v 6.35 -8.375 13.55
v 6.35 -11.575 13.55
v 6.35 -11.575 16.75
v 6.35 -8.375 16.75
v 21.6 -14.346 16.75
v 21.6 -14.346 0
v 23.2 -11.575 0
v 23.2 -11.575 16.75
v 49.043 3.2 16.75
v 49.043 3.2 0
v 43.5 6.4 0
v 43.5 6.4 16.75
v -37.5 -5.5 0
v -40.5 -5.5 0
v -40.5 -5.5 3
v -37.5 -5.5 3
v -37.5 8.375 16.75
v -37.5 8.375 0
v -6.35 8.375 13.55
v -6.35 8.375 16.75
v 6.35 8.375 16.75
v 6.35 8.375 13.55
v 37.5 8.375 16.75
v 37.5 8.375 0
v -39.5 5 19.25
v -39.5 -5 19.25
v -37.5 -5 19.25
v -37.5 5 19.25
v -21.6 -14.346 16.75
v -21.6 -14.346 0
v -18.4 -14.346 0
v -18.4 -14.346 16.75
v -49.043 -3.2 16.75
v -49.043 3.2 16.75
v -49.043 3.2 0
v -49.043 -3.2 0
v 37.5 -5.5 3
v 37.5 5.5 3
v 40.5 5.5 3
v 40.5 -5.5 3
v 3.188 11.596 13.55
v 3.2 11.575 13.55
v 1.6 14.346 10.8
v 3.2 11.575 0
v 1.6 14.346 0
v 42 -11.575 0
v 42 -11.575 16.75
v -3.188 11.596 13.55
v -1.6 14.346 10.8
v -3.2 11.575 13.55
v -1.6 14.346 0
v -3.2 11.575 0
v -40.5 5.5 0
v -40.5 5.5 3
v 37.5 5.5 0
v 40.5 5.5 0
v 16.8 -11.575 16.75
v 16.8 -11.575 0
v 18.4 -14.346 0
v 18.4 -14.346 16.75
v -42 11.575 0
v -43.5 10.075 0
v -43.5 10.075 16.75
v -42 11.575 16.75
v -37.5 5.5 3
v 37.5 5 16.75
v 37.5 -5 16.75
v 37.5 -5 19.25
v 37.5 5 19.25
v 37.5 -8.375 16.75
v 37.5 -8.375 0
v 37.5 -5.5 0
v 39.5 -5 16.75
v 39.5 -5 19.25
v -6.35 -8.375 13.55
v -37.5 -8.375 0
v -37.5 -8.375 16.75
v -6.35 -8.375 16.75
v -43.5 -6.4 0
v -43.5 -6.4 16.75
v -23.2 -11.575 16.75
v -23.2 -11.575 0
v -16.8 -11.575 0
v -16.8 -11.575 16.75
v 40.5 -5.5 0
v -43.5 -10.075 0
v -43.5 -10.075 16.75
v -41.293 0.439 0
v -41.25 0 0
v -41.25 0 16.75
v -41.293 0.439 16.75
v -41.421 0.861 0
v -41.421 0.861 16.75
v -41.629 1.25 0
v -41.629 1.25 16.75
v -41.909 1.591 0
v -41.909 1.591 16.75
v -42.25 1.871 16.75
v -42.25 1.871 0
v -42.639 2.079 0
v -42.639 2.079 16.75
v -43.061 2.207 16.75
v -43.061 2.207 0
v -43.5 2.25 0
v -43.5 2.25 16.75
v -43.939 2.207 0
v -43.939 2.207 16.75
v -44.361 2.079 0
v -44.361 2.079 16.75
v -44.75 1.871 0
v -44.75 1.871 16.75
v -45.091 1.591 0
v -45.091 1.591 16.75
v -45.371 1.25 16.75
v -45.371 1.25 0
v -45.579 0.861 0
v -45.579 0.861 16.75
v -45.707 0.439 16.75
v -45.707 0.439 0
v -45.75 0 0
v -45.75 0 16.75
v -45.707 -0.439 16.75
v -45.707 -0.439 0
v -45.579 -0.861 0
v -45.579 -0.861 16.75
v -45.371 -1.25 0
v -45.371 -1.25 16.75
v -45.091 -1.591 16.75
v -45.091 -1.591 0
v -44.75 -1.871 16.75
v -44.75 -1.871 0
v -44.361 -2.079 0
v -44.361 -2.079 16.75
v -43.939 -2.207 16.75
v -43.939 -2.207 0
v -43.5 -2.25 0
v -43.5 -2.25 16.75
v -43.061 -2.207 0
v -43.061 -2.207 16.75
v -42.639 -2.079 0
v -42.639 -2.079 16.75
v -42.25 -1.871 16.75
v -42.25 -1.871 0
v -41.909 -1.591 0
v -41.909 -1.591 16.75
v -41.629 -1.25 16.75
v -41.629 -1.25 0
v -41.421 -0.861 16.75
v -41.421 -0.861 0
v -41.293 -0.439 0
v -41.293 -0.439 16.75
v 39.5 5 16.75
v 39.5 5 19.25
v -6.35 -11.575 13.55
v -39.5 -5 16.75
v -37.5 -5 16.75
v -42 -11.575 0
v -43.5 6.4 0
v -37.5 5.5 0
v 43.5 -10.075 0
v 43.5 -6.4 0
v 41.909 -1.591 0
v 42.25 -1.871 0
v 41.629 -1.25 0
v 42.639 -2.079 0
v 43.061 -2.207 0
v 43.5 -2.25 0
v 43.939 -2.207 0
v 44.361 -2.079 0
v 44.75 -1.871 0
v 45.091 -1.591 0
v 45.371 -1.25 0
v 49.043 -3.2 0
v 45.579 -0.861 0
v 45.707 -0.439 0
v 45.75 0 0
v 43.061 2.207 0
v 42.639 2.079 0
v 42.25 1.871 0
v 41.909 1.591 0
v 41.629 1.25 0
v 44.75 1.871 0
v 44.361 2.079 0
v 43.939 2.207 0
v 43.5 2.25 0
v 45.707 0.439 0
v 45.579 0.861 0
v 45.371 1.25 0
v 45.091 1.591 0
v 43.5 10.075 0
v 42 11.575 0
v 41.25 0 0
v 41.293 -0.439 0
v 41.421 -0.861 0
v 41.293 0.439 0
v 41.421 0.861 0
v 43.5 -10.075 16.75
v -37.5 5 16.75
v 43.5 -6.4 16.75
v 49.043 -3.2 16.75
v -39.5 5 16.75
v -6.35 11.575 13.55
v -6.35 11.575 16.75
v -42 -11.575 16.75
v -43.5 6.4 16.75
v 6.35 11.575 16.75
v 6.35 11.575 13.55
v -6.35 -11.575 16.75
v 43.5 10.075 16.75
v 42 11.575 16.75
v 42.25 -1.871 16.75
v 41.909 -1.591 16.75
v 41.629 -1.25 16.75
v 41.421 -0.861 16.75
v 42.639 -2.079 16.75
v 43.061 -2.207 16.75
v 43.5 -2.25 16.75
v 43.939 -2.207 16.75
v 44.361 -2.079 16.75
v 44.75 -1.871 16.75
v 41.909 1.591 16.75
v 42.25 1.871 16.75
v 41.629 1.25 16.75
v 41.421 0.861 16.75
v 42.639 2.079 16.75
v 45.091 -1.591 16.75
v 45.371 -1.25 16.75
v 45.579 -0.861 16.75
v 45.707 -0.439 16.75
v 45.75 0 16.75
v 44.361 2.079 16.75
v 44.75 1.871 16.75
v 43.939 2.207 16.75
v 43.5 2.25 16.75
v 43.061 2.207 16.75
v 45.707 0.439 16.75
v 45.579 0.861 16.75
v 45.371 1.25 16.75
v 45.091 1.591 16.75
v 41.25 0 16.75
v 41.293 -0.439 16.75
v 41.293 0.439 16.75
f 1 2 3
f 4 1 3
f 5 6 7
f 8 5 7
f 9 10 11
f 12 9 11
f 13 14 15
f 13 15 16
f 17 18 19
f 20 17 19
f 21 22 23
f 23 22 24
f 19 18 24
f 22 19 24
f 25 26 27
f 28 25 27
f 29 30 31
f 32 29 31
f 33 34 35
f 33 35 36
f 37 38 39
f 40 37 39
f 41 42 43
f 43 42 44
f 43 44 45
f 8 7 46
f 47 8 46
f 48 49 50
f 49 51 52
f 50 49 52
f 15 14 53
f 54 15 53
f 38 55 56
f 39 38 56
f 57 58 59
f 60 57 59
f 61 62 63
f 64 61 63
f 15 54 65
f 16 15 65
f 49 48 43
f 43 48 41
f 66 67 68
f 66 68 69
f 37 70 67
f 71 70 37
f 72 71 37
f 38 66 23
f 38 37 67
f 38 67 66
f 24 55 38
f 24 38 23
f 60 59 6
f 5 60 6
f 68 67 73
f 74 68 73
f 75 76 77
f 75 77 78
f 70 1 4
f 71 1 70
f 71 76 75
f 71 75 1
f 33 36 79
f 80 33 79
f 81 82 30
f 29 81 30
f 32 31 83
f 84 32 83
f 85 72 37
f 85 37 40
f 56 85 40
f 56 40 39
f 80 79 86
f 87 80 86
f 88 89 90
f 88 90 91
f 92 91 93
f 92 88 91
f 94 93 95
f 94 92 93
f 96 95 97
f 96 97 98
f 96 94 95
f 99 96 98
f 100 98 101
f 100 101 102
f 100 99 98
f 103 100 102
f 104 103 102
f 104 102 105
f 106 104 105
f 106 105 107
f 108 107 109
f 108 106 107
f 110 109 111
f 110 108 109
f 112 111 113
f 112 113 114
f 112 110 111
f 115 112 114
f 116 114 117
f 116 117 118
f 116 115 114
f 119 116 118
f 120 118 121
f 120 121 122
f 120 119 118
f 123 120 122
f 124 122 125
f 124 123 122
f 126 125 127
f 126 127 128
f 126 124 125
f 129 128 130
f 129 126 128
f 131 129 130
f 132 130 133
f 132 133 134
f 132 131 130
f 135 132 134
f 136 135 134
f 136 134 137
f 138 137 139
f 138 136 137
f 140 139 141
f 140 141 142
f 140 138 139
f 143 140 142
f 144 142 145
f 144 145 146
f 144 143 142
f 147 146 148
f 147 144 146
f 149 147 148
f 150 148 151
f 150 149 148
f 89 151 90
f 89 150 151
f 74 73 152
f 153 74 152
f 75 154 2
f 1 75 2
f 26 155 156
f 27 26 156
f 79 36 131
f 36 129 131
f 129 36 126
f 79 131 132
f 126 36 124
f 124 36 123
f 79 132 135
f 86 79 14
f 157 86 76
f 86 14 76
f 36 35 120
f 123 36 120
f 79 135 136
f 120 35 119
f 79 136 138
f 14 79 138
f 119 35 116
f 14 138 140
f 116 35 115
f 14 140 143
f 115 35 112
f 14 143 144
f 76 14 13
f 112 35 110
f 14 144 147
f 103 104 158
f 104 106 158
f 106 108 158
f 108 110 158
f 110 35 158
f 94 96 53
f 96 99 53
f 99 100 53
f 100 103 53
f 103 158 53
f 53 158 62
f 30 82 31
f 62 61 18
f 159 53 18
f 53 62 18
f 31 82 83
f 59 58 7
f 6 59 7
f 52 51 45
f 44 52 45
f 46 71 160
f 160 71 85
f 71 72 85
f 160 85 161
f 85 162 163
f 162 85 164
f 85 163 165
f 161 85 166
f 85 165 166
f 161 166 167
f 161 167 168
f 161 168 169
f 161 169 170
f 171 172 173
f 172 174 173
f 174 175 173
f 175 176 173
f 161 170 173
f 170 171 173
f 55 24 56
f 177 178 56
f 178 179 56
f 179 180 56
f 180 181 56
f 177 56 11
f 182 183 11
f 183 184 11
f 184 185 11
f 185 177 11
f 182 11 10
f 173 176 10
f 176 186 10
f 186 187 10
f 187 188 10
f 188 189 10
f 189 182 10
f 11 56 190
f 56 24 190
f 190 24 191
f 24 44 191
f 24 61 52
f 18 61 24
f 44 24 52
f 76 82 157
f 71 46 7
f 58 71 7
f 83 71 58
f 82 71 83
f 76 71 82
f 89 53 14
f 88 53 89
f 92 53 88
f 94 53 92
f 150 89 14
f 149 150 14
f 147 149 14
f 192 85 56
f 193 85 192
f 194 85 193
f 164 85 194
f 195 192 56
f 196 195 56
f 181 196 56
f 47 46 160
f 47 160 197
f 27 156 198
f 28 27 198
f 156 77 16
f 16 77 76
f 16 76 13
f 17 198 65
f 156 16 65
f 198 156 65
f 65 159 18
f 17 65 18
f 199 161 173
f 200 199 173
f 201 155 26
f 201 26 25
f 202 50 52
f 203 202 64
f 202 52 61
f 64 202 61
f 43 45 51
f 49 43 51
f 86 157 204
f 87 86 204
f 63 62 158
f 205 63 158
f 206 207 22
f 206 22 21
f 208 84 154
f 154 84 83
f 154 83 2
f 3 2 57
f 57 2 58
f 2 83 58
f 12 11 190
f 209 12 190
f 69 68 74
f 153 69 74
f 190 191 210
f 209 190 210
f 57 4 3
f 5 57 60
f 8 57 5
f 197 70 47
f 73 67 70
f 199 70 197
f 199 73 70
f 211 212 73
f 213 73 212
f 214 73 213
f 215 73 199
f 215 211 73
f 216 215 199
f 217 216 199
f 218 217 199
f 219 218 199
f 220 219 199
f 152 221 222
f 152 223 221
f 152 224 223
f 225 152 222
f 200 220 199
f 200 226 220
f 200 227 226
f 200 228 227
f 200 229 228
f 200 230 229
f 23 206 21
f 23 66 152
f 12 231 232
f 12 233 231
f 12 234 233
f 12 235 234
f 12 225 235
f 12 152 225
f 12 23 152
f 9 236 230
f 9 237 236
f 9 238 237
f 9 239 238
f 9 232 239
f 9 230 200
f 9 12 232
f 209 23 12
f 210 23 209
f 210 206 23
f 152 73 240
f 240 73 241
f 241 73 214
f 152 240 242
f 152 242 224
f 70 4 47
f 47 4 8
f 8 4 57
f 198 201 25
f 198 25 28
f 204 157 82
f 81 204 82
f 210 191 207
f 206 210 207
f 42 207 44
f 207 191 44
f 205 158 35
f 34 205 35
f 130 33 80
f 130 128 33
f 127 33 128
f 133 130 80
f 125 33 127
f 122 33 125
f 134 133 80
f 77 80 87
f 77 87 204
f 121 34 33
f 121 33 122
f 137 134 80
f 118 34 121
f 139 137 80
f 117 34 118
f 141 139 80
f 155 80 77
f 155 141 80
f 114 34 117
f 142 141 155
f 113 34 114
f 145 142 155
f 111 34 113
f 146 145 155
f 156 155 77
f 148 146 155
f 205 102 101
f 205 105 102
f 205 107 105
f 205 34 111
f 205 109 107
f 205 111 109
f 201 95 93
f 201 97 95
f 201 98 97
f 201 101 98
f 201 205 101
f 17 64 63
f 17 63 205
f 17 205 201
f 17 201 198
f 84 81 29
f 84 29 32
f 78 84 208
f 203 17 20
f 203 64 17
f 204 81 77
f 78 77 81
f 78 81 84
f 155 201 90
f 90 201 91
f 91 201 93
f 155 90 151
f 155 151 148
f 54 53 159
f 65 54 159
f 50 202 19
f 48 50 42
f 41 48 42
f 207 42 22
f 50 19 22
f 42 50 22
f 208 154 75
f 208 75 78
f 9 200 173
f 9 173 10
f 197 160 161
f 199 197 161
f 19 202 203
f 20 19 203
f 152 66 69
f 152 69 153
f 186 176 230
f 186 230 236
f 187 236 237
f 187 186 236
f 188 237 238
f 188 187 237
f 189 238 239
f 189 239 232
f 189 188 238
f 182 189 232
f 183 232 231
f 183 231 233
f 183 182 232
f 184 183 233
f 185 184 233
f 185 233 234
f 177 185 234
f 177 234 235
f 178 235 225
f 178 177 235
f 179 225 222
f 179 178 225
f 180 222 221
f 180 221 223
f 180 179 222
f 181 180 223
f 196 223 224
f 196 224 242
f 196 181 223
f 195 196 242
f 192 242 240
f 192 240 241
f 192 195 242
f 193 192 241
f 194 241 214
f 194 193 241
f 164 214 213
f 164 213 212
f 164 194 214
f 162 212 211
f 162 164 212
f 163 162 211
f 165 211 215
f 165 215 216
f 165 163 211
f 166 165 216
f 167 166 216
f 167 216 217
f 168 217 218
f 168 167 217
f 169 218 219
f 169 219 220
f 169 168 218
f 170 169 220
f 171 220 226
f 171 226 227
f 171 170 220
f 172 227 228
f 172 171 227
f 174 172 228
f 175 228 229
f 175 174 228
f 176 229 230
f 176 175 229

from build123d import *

# Parameters (mm, degrees)
F0_R     = 2.25
F0_W     = 75
F0_H     = 16.75
F1_DEPTH = 16.75
F2_SIZE  = 1.5
F3_W     = 3
F3_H     = 11
F4_DEPTH = 3
F5_W     = 2
F5_H     = 10
F6_DEPTH = 2.5
F7_W     = 12.7
F7_H     = 6.4
F8_DEPTH = 25.9222812921
F9_SIZE  = 2.75


with BuildPart() as f1:
    # F0 (on Top) → F1 (new body)
    with BuildSketch(Plane.XY):
        Polygon((43.5, 6.4), (43.5, 11.575), (3.2, 11.575), (1.6, 14.3462812921), (-1.6, 14.3462812921), (-3.2, 11.575), (-43.5, 11.575), (-43.5, 6.4), (-49.0425625842, 3.2), (-49.0425625842, -3.2), (-43.5, -6.4), (-43.5, -11.575), (-23.2, -11.575), (-21.6, -14.3462812921), (-18.4, -14.3462812921), (-16.8, -11.575), (16.8, -11.575), (18.4, -14.3462812921), (21.6, -14.3462812921), (23.2, -11.575), (43.5, -11.575), (43.5, -6.4), (49.0425625842, -3.2), (49.0425625842, 3.2), align=None)
        with Locations((-43.5, 0)):
            Circle(F0_R, mode=Mode.SUBTRACT)
        Rectangle(F0_W, F0_H, mode=Mode.SUBTRACT)
        with Locations((43.5, 0)):
            Circle(F0_R, mode=Mode.SUBTRACT)
    extrude(amount=F1_DEPTH)

    # F2
    f2_edges = [f1.edges().sort_by_distance(p)[0] for p in [
        (-43.5, 11.575, 8.375),
        (43.5, 11.575, 8.375),
        (43.5, -11.575, 8.375),
        (-43.5, -11.575, 8.375),
    ]]
    chamfer(f2_edges, length=F2_SIZE)

    # F3 (on Top) → F4 (cut)
    with BuildSketch(Plane.XY):
        with Locations((-39, 0)):
            Rectangle(F3_W, F3_H)
        with Locations((39, 0)):
            Rectangle(F3_W, F3_H)
    extrude(amount=F4_DEPTH, mode=Mode.SUBTRACT)

    # F5 (on face) → F6 (join)
    with BuildSketch(Plane.XY.offset(16.75)):
        with Locations((-38.5, 0)):
            Rectangle(F5_W, F5_H)
        with Locations((38.5, 0)):
            Rectangle(F5_W, F5_H)
    extrude(amount=F6_DEPTH)

    # F7 (on face) → F8 (cut, through all)
    with BuildSketch(Plane.XZ.offset(11.575)):
        with Locations((0, 16.75)):
            Rectangle(F7_W, F7_H)
    extrude(amount=-F8_DEPTH, mode=Mode.SUBTRACT)

    # F9
    f9_edges = [f1.edges().sort_by_distance(p)[0] for p in [
        (0, 14.346281, 13.55),
    ]]
    chamfer(f9_edges, length=F9_SIZE)


solid = f1.part
